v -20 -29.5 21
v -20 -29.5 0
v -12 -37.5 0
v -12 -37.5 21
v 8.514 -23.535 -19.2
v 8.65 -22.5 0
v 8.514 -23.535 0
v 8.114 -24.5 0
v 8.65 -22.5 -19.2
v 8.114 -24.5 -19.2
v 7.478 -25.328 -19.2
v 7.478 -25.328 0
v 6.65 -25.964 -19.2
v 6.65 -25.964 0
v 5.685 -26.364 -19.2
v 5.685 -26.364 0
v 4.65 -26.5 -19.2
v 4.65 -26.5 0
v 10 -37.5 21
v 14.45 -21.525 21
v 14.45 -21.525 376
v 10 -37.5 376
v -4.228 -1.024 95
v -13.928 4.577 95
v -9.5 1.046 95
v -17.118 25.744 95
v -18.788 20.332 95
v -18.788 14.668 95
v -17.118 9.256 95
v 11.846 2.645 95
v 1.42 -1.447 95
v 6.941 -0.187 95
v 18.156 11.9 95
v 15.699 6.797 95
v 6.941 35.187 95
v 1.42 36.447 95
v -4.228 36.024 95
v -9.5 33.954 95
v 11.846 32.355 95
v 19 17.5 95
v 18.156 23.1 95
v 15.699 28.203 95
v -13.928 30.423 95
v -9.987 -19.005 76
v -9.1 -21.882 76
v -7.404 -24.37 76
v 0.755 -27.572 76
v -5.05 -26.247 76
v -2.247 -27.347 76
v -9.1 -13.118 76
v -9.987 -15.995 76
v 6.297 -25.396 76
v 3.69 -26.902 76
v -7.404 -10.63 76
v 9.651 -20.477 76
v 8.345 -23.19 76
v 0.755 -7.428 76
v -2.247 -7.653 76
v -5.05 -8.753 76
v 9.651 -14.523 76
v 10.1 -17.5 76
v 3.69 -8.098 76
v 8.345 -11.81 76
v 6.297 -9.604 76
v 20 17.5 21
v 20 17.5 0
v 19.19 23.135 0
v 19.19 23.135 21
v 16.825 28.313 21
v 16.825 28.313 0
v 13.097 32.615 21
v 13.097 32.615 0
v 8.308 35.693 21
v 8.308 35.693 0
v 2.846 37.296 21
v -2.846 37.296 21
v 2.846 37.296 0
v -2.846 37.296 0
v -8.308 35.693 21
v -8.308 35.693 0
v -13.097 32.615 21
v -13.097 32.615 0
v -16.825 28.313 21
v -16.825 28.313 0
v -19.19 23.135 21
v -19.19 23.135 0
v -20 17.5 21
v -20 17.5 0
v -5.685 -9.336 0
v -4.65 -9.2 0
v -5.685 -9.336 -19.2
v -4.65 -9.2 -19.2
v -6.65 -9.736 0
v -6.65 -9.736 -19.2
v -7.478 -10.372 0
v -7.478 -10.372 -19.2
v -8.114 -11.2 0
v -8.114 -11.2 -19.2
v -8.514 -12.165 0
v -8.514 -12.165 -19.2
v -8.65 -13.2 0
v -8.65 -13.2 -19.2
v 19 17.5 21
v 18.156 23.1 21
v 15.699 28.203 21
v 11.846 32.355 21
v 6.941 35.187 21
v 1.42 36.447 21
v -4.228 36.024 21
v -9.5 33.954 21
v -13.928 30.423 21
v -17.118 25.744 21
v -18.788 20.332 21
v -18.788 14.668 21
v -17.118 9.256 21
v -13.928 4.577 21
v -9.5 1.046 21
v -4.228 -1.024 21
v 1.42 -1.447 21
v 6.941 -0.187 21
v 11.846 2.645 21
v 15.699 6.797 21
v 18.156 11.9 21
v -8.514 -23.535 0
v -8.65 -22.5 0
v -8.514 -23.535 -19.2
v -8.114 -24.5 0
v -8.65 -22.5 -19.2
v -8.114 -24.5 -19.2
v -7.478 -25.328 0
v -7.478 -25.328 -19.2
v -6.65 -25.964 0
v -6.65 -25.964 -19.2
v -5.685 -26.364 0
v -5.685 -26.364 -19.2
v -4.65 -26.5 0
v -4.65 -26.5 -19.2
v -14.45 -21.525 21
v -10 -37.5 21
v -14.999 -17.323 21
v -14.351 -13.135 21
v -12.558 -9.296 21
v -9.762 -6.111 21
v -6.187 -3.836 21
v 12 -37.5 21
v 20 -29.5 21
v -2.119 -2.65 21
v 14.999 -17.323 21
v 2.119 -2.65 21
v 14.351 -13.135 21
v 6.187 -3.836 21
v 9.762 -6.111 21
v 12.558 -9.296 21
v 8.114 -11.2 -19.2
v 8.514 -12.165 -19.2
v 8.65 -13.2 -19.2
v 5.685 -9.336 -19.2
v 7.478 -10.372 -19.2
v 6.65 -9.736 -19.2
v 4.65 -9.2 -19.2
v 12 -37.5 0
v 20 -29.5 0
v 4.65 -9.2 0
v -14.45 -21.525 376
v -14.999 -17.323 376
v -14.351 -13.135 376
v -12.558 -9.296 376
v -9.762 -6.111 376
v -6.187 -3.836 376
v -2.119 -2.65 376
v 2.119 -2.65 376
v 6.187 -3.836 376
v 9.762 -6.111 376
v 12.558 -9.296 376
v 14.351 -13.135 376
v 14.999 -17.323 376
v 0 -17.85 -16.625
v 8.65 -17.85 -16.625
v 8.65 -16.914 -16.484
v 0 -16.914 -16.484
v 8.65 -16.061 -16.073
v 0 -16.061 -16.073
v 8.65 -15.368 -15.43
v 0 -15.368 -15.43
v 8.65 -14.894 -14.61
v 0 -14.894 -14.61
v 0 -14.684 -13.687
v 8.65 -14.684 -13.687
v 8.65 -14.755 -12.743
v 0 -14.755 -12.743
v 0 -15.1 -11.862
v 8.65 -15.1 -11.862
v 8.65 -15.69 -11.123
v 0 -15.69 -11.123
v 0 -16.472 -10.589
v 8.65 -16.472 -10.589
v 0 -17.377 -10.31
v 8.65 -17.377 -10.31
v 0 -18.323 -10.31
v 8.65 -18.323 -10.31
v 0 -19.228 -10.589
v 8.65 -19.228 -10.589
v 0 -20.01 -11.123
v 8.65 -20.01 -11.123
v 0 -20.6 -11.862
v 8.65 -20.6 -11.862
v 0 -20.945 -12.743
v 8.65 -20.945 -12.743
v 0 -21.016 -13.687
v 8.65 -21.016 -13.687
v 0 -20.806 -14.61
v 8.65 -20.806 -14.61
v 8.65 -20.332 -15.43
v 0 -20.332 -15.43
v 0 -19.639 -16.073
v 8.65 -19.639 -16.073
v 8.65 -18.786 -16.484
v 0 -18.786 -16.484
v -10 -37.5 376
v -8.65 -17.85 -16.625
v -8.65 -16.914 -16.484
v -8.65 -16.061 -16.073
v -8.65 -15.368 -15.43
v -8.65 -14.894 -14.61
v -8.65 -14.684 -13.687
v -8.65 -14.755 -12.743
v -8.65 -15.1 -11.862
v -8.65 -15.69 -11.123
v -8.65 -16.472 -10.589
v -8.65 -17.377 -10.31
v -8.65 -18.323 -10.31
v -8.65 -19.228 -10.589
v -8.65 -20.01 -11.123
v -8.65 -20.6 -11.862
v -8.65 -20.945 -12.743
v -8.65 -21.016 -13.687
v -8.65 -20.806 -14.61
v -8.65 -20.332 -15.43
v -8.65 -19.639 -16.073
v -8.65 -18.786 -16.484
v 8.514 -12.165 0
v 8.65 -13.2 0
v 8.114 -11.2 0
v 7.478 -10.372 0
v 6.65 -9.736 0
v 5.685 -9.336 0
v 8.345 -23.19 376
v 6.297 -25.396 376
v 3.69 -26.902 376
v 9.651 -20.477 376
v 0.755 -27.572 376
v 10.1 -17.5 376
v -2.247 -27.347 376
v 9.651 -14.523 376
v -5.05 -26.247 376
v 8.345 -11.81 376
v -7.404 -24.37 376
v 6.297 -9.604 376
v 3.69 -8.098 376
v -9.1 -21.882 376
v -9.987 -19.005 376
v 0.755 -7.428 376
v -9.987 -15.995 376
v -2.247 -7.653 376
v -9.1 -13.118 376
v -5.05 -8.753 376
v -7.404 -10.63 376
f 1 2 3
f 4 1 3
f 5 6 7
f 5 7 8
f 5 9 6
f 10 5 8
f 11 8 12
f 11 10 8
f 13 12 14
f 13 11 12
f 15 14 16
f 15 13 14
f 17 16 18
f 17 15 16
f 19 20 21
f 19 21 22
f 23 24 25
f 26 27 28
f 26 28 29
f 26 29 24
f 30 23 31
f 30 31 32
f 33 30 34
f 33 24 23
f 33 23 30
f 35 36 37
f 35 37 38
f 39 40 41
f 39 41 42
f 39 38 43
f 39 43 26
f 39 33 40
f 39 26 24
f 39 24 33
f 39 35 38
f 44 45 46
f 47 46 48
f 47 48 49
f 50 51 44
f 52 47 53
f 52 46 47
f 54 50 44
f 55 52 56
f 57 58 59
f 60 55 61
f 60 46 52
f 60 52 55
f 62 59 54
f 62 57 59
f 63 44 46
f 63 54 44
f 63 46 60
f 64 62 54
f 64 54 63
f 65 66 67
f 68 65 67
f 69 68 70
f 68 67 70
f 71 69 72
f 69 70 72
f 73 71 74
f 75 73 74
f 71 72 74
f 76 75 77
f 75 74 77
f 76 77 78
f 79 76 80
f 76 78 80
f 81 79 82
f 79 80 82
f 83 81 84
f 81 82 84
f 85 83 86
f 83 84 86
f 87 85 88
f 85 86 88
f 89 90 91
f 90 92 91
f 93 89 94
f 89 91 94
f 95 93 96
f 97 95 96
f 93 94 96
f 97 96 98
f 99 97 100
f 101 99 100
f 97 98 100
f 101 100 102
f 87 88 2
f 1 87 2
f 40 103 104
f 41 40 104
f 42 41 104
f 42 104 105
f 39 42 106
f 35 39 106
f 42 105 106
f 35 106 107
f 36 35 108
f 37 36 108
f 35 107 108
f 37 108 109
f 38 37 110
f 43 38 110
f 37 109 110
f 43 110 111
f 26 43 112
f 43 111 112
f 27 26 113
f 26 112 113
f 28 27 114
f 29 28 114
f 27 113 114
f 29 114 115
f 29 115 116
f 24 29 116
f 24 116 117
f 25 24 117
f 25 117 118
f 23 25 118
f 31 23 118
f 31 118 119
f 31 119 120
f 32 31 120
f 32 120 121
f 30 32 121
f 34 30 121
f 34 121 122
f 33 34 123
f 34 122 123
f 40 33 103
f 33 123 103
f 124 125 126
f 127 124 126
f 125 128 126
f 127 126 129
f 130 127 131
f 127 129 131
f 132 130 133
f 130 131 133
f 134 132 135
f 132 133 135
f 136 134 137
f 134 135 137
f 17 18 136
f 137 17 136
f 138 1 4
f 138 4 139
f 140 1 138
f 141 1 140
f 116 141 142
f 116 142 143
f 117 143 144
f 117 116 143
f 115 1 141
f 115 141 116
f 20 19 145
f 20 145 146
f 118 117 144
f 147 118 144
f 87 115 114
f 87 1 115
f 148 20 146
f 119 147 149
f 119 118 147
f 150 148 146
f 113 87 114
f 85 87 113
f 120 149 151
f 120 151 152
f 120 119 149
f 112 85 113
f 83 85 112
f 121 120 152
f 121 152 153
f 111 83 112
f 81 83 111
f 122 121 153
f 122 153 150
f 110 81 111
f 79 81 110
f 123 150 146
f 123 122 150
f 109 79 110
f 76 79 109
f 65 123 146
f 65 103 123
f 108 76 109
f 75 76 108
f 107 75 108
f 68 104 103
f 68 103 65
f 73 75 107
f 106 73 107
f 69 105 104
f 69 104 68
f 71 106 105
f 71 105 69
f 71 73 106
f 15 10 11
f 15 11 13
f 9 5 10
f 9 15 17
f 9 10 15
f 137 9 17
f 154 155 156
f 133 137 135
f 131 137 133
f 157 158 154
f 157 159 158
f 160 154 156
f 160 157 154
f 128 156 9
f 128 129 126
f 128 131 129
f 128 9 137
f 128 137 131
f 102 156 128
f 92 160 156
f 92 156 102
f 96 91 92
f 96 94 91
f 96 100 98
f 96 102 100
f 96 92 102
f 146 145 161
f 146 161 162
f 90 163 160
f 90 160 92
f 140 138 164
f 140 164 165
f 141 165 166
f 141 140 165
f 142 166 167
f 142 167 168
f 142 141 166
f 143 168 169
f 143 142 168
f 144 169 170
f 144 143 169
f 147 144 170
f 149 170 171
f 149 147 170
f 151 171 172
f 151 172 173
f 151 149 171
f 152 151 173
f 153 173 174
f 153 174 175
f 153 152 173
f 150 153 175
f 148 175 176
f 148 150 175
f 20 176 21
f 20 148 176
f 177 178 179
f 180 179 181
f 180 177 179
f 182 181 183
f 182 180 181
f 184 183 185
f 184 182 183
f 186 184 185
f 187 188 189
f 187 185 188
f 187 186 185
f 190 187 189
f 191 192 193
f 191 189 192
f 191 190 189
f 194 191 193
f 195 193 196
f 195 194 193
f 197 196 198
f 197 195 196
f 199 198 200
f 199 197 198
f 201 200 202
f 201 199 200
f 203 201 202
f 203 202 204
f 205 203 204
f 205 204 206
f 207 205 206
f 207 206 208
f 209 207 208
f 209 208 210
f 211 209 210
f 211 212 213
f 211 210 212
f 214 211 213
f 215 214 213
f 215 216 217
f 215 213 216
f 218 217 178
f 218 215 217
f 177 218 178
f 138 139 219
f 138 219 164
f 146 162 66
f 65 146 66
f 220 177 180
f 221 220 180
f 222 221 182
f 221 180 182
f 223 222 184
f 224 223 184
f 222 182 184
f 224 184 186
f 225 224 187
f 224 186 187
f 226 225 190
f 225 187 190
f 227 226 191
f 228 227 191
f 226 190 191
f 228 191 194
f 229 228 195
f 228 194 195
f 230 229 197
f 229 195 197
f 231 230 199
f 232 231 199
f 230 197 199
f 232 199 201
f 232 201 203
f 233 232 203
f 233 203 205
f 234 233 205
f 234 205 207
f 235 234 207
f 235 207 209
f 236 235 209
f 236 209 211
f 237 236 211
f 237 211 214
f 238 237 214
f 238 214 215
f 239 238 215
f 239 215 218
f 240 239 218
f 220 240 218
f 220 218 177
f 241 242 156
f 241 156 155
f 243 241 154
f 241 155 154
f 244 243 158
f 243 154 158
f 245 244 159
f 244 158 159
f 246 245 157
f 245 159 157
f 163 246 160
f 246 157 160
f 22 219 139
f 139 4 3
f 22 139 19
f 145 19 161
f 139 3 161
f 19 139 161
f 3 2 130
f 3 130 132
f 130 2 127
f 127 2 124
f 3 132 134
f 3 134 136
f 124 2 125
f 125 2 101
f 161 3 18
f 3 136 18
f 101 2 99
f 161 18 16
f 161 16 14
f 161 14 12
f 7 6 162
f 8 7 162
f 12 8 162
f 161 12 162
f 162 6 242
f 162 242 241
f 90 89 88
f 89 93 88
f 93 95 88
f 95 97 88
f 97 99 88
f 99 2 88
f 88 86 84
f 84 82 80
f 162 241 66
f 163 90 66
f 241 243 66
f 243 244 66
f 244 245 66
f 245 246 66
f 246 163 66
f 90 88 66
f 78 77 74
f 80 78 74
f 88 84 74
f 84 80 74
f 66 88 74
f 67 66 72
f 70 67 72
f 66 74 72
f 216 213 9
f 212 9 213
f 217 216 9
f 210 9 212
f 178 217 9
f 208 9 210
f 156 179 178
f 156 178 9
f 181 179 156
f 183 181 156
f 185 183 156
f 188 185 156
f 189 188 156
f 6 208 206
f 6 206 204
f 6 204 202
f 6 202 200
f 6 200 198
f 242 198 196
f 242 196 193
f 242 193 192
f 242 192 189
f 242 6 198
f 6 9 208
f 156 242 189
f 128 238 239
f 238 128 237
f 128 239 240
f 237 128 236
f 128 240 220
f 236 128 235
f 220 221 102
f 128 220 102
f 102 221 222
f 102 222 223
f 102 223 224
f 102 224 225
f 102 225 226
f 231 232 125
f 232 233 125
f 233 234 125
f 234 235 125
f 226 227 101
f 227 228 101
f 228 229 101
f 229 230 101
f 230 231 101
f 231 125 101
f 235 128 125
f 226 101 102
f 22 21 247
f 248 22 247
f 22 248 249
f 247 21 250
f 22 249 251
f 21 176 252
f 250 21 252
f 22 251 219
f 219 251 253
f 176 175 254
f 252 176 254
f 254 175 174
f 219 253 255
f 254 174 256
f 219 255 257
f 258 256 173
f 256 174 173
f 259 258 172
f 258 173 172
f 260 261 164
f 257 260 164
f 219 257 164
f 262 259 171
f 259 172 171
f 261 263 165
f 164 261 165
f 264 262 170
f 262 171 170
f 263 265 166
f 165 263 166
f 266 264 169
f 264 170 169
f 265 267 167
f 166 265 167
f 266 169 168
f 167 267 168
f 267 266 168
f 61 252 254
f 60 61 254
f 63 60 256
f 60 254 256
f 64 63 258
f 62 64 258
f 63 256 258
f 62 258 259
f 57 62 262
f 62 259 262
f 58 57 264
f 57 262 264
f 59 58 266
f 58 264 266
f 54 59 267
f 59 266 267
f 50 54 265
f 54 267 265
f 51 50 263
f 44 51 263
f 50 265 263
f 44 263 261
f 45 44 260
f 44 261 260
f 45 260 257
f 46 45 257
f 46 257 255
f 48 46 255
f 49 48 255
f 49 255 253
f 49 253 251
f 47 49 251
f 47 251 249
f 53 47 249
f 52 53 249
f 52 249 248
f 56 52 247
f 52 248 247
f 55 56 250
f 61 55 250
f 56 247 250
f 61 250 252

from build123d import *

# Parameters (mm, degrees)
BOSS_EXTRUDE1_DEPTH     = 21
SKETCH2_R               = 19
BOSS_EXTRUDE2_DEPTH     = 74
BOSS_EXTRUDE3_DEPTH     = 355
SKETCH4_W               = 17.3
SKETCH4_H               = 17.3
BOSS_EXTRUDE4_DEPTH     = 19.2
FILLET1_R               = 4
SKETCH5_R               = 10.1
CUT_EXTRUDE1_DEPTH      = 300
SKETCH6_R               = 3.175
CUT_EXTRUDE2_DEPTH      = 21
CUT_EXTRUDE2_DEPTH_BACK = 21


with BuildPart() as part:
    # Sketch1 → Boss-Extrude1 (new body)
    with BuildSketch(Plane.XY):
        with BuildLine():
            Line((-12, -37.5), (12, -37.5))
            Line((12, -37.5), (20, -29.5))
            Line((20, -29.5), (20, 17.5))
            ThreePointArc((20, 17.5), (0, 37.5), (-20, 17.5))
            Line((-20, 17.5), (-20, -29.5))
            Line((-20, -29.5), (-12, -37.5))
        make_face()
    extrude(amount=BOSS_EXTRUDE1_DEPTH)

    # Sketch2 → Boss-Extrude2 (add)
    with BuildSketch(Plane.XY.offset(21)):
        with Locations((0, 17.5)):
            Circle(SKETCH2_R)
    extrude(amount=BOSS_EXTRUDE2_DEPTH)

    # Sketch3 → Boss-Extrude3 (add)
    with BuildSketch(Plane.XY.offset(21)):
        with BuildLine():
            Line((14.449874371, -21.525062814), (10, -37.5))
            Line((10, -37.5), (-10, -37.5))
            Line((-10, -37.5), (-14.449874371, -21.525062814))
            ThreePointArc((-14.449874371, -21.525062814), (0, -2.5), (14.449874371, -21.525062814))
        make_face()
    extrude(amount=BOSS_EXTRUDE3_DEPTH)

    # Sketch4 → Boss-Extrude4 (add)
    with BuildSketch(Plane(origin=(0, 0, 0), x_dir=(-1, 0, 0), z_dir=(0, 0, -1))):
        with Locations((0, -17.85)):
            Rectangle(SKETCH4_W, SKETCH4_H)
    extrude(amount=BOSS_EXTRUDE4_DEPTH)

    # Fillet1
    fillet1_edges = [part.edges().sort_by_distance(p)[0] for p in [
        (-8.65, -26.5, -9.6),
        (-8.65, -9.2, -9.6),
        (8.65, -9.2, -9.6),
        (8.65, -26.5, -9.6),
    ]]
    fillet(fillet1_edges, radius=FILLET1_R)

    # Sketch5 → Cut-Extrude1 (cut)
    with BuildSketch(Plane.XY.offset(376)):
        with Locations((0, -17.5)):
            Circle(SKETCH5_R)
    extrude(amount=-CUT_EXTRUDE1_DEPTH, mode=Mode.SUBTRACT)

    # Sketch6 → Cut-Extrude2 (cut, two sides)
    with BuildSketch(Plane(origin=(0, 0, 0), x_dir=(0, 0, -1), z_dir=(1, 0, 0))) as cut_extrude2_sk:
        with Locations((13.45, -17.85)):
            Circle(SKETCH6_R)
    extrude(amount=CUT_EXTRUDE2_DEPTH, mode=Mode.SUBTRACT)
    extrude(cut_extrude2_sk.sketch, amount=-CUT_EXTRUDE2_DEPTH_BACK, mode=Mode.SUBTRACT)


solid = part.part
